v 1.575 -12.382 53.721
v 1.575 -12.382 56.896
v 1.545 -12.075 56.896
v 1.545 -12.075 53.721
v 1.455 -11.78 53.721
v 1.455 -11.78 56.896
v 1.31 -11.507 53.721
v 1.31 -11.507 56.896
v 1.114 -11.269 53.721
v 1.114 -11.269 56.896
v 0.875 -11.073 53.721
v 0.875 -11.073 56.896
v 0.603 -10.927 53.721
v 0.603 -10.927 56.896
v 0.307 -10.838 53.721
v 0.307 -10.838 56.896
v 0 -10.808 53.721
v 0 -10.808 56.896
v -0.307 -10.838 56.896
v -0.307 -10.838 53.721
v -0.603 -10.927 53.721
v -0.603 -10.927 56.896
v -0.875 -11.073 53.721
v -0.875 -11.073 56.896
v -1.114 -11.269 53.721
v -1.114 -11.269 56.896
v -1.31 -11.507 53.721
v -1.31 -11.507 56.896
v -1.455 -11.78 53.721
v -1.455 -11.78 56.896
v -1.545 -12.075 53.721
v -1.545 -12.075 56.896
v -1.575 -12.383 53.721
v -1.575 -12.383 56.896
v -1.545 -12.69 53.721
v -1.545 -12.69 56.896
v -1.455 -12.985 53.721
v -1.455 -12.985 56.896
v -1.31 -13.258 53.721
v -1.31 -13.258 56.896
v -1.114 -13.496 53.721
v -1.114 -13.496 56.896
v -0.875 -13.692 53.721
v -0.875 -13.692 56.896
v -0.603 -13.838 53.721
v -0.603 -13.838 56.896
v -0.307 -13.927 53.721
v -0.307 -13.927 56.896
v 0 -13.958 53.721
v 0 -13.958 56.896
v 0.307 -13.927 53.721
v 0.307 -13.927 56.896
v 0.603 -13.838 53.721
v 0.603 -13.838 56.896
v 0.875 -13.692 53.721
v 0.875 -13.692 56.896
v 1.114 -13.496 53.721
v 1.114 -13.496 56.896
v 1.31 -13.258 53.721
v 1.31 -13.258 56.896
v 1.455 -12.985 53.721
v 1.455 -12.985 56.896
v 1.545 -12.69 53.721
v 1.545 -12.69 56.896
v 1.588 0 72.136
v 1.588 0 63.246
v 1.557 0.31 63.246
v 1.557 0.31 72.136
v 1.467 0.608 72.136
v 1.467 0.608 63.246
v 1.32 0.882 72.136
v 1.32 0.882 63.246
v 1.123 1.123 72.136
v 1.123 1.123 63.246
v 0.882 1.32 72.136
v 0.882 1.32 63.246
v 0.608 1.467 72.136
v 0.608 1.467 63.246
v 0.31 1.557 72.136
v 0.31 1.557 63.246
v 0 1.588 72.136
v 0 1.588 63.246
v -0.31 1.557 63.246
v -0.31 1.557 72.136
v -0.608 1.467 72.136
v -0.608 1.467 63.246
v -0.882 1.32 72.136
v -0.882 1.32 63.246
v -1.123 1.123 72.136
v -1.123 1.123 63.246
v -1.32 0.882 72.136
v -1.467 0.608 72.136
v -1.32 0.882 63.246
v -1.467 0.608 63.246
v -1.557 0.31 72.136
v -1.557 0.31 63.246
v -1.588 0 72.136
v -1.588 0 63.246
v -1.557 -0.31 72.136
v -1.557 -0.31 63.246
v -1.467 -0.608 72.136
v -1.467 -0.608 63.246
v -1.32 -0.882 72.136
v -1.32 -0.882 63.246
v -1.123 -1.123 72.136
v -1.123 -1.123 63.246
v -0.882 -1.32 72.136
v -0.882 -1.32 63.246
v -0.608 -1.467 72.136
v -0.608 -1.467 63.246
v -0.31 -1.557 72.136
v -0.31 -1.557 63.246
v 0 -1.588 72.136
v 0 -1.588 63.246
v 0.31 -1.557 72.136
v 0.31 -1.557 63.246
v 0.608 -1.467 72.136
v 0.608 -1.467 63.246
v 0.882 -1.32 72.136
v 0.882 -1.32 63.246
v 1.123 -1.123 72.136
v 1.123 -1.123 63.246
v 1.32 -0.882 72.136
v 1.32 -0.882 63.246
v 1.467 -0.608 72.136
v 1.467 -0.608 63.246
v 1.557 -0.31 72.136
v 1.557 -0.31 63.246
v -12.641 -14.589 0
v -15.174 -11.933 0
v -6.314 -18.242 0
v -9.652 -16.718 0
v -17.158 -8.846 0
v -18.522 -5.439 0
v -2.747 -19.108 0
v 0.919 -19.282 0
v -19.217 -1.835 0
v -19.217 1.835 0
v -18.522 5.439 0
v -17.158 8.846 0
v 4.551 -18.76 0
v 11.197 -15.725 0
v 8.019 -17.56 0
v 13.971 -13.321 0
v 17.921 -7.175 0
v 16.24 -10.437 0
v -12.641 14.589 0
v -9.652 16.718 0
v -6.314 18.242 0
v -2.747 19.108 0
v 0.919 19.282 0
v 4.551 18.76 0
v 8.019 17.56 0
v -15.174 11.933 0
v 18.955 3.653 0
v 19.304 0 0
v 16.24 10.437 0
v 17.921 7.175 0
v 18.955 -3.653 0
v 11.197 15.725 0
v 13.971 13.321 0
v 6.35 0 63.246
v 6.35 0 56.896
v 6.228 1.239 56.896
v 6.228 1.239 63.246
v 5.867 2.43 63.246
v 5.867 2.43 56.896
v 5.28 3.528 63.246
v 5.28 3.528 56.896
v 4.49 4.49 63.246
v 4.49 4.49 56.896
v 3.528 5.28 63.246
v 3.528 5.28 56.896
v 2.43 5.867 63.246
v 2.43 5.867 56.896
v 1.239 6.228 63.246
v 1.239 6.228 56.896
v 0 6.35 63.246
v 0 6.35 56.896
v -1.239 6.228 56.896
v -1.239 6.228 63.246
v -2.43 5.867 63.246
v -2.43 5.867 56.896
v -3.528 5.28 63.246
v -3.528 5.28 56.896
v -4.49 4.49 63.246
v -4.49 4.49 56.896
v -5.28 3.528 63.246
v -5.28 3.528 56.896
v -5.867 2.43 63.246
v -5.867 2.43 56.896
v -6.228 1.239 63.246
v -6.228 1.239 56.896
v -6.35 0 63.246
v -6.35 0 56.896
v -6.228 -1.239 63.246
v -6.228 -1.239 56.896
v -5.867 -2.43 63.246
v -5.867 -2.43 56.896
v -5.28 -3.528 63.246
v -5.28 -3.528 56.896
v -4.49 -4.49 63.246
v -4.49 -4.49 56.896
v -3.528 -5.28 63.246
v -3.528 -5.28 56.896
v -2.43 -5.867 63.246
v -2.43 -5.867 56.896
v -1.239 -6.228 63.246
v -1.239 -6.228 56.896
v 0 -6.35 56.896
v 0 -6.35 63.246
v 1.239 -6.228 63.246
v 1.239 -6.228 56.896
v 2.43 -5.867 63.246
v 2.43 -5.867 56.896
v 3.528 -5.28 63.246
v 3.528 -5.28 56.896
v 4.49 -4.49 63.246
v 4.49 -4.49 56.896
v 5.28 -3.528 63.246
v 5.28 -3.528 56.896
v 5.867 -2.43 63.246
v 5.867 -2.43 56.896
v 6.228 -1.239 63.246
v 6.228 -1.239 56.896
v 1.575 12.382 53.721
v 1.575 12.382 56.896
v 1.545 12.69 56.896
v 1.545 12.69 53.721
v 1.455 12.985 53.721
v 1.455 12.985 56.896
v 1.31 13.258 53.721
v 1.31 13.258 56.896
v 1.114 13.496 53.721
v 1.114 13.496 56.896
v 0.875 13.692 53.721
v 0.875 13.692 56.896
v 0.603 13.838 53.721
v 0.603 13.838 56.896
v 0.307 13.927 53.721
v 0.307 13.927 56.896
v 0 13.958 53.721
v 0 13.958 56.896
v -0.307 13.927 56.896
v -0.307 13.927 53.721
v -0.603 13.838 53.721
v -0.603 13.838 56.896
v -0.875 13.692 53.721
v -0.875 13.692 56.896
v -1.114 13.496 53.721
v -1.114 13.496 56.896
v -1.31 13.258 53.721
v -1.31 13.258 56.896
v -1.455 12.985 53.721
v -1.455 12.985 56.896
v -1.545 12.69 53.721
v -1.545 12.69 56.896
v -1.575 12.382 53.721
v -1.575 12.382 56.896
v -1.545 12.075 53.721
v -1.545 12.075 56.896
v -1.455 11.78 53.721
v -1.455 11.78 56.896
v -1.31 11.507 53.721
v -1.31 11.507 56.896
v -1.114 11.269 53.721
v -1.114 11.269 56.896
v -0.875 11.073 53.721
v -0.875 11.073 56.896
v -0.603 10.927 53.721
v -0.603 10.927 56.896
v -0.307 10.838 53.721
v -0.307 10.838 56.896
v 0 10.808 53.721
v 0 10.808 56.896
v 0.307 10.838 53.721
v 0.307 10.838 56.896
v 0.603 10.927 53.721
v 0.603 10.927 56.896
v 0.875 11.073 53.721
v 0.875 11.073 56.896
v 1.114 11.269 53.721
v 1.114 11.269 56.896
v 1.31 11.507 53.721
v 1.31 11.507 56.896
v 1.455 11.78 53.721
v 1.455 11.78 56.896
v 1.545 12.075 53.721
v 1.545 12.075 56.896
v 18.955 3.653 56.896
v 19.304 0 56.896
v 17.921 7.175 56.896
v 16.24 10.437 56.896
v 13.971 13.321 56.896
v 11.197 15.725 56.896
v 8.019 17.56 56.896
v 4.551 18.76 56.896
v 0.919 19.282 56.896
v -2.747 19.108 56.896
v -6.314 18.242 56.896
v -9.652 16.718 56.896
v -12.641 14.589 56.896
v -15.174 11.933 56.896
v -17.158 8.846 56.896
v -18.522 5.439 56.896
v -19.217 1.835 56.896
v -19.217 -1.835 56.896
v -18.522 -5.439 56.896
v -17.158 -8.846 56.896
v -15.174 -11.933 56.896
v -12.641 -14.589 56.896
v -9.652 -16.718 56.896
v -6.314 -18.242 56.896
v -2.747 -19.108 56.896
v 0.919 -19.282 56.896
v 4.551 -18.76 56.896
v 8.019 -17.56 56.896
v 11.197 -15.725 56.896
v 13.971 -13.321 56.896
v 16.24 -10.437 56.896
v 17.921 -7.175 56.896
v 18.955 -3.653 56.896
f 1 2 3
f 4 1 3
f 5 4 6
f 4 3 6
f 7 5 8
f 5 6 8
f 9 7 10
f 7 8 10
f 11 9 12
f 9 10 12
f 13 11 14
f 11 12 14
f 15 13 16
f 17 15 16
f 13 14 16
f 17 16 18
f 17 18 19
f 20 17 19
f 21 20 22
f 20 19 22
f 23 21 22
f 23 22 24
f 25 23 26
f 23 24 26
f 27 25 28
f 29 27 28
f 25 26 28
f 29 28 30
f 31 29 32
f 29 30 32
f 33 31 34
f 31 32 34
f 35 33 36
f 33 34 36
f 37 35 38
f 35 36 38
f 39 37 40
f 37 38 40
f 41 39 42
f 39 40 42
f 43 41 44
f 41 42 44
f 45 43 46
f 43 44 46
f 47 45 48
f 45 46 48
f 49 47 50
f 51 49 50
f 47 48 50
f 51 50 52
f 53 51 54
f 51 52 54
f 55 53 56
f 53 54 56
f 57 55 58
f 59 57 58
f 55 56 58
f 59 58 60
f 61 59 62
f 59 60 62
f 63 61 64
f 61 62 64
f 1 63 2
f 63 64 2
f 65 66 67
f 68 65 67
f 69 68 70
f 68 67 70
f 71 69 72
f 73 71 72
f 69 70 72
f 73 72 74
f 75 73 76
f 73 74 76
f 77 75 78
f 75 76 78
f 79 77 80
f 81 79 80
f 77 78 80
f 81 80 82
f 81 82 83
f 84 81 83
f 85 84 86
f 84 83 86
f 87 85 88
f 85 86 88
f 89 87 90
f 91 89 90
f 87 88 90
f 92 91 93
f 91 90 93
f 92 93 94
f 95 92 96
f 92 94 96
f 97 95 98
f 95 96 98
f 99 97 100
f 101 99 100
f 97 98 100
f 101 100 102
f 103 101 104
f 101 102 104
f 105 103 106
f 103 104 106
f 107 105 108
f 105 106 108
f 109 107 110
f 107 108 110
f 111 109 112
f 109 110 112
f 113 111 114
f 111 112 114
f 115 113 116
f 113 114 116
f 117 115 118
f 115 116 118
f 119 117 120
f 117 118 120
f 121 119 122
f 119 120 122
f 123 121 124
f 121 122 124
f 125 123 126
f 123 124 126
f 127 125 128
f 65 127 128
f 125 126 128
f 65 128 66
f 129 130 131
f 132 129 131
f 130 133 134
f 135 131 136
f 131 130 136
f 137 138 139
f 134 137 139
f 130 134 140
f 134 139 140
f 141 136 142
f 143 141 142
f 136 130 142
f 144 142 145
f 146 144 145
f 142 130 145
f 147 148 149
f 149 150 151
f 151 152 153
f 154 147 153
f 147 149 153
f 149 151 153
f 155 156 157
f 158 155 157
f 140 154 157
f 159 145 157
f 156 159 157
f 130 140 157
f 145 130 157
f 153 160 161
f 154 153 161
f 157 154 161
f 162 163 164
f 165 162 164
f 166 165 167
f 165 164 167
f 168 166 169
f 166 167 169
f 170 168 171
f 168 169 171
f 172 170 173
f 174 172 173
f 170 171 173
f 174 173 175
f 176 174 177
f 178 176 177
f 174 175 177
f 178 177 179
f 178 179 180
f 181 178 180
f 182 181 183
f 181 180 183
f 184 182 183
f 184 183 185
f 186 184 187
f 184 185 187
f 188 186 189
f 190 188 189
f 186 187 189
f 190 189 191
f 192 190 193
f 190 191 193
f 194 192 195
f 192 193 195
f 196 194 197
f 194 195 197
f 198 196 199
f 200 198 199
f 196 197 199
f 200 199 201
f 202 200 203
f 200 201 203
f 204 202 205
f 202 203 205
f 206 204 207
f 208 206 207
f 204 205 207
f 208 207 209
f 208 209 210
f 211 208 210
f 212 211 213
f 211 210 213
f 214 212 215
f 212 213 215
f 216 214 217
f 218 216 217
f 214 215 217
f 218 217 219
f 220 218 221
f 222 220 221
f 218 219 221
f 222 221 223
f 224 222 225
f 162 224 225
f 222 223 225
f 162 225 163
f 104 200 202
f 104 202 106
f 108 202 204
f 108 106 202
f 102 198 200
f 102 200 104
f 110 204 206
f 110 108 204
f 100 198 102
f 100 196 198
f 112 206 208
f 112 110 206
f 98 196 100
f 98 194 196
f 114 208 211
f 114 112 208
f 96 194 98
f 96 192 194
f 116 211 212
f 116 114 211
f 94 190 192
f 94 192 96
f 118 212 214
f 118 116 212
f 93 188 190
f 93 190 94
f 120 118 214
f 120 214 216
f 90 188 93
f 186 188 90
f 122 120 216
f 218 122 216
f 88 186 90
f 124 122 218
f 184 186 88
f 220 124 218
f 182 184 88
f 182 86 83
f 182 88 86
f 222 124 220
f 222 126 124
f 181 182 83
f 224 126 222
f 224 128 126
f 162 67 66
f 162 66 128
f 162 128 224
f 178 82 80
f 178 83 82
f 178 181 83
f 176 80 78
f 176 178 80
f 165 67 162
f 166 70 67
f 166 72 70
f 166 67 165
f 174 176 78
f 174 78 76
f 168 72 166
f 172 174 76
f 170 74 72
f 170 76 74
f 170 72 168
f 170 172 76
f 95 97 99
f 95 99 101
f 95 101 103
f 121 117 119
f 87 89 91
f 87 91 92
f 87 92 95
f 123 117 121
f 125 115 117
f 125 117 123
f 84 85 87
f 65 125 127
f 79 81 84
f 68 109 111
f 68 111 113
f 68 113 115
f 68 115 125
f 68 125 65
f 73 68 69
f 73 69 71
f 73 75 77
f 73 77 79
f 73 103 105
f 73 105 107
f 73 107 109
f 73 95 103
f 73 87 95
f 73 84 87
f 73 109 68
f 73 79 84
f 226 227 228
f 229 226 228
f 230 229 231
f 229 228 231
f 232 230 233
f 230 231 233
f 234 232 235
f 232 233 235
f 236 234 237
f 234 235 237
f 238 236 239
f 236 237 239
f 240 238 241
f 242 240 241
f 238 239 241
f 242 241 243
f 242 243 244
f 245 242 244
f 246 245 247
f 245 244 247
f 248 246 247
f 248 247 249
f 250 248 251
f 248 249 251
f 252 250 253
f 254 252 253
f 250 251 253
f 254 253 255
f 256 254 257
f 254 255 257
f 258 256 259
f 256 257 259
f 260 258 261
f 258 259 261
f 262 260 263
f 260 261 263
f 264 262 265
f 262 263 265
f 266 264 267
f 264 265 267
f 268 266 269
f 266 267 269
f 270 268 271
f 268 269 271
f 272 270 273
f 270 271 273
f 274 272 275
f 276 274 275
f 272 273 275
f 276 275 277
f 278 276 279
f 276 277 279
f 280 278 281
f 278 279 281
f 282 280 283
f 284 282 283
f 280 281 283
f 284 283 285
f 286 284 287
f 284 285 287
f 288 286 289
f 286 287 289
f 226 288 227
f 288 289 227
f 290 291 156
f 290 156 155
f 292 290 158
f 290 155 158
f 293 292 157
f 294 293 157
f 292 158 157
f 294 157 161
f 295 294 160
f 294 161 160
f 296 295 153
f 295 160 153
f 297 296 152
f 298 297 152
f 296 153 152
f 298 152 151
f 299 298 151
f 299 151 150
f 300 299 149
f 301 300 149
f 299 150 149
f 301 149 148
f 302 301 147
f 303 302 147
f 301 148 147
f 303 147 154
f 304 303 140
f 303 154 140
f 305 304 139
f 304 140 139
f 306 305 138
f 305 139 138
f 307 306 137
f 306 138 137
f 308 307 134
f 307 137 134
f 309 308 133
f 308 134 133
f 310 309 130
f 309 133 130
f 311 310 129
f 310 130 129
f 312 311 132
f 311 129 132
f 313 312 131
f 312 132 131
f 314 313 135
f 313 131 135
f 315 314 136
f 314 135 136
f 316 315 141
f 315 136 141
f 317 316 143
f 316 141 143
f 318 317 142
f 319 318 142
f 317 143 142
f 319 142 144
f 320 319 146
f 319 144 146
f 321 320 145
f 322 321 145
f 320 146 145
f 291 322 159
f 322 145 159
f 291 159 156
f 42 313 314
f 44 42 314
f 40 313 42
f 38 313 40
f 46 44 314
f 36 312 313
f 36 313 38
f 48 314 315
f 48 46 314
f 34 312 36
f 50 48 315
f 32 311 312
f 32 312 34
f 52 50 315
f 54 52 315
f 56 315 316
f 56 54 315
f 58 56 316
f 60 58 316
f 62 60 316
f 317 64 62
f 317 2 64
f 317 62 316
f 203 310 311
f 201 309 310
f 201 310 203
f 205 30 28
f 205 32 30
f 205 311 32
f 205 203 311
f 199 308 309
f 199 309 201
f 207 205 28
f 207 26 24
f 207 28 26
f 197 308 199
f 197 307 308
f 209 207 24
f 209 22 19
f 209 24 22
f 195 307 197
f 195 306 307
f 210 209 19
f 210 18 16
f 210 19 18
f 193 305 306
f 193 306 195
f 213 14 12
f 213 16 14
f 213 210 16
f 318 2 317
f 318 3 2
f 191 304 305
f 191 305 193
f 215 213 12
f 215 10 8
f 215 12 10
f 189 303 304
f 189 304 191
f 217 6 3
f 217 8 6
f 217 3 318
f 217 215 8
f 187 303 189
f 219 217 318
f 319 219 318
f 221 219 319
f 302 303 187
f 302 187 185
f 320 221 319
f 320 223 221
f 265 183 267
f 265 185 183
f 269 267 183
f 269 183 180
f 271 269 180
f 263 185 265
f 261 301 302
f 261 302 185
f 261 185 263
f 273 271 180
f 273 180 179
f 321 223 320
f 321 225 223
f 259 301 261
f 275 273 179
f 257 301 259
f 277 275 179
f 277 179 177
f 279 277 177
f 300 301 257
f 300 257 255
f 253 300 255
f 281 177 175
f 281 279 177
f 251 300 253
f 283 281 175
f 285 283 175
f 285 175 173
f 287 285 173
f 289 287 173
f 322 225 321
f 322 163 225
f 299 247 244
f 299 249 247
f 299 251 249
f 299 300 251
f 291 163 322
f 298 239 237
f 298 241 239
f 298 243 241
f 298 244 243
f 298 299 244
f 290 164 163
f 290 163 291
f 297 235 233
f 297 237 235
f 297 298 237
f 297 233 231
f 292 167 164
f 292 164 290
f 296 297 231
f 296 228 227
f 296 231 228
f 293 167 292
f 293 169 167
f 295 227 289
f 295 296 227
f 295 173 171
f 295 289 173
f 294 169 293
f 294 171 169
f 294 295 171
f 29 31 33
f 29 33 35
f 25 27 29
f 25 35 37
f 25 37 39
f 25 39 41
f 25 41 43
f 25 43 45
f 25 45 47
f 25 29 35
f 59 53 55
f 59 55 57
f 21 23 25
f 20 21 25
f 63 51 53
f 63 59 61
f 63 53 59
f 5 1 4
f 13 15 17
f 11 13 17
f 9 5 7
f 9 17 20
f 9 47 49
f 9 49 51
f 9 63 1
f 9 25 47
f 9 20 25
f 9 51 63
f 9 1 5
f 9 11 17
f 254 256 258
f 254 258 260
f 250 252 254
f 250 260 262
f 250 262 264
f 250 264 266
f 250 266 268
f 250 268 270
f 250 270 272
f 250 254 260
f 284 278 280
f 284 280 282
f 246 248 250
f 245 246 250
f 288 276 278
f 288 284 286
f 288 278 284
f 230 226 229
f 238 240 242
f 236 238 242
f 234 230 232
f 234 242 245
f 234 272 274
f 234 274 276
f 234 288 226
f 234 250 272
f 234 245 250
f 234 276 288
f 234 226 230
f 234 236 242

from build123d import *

# Parameters (mm, degrees)
SKETCH1_R           = 19.304
BOSS_EXTRUDE1_DEPTH = 56.896
SKETCH2_R           = 6.35
BOSS_EXTRUDE2_DEPTH = 6.35
SKETCH3_R           = 1.575
CUT_EXTRUDE1_DEPTH  = 3.175
SKETCH4_R           = 1.5875
BOSS_EXTRUDE3_DEPTH = 8.89


with BuildPart() as part:
    # Sketch1 → Boss-Extrude1 (new body)
    with BuildSketch(Plane.XY):
        Circle(SKETCH1_R)
    extrude(amount=BOSS_EXTRUDE1_DEPTH)

    # Sketch2 → Boss-Extrude2 (add)
    with BuildSketch(Plane.XY.offset(56.896)):
        Circle(SKETCH2_R)
    extrude(amount=BOSS_EXTRUDE2_DEPTH)

    # Sketch3 → Cut-Extrude1 (cut)
    with BuildSketch(Plane.XY.offset(56.896)):
        with Locations((0, 12.3825)):
            Circle(SKETCH3_R)
        with Locations((0, -12.3825)):
            Circle(SKETCH3_R)
    extrude(amount=-CUT_EXTRUDE1_DEPTH, mode=Mode.SUBTRACT)

    # Sketch4 → Boss-Extrude3 (add)
    with BuildSketch(Plane.XY.offset(63.246)):
        Circle(SKETCH4_R)
    extrude(amount=BOSS_EXTRUDE3_DEPTH)


solid = part.part
